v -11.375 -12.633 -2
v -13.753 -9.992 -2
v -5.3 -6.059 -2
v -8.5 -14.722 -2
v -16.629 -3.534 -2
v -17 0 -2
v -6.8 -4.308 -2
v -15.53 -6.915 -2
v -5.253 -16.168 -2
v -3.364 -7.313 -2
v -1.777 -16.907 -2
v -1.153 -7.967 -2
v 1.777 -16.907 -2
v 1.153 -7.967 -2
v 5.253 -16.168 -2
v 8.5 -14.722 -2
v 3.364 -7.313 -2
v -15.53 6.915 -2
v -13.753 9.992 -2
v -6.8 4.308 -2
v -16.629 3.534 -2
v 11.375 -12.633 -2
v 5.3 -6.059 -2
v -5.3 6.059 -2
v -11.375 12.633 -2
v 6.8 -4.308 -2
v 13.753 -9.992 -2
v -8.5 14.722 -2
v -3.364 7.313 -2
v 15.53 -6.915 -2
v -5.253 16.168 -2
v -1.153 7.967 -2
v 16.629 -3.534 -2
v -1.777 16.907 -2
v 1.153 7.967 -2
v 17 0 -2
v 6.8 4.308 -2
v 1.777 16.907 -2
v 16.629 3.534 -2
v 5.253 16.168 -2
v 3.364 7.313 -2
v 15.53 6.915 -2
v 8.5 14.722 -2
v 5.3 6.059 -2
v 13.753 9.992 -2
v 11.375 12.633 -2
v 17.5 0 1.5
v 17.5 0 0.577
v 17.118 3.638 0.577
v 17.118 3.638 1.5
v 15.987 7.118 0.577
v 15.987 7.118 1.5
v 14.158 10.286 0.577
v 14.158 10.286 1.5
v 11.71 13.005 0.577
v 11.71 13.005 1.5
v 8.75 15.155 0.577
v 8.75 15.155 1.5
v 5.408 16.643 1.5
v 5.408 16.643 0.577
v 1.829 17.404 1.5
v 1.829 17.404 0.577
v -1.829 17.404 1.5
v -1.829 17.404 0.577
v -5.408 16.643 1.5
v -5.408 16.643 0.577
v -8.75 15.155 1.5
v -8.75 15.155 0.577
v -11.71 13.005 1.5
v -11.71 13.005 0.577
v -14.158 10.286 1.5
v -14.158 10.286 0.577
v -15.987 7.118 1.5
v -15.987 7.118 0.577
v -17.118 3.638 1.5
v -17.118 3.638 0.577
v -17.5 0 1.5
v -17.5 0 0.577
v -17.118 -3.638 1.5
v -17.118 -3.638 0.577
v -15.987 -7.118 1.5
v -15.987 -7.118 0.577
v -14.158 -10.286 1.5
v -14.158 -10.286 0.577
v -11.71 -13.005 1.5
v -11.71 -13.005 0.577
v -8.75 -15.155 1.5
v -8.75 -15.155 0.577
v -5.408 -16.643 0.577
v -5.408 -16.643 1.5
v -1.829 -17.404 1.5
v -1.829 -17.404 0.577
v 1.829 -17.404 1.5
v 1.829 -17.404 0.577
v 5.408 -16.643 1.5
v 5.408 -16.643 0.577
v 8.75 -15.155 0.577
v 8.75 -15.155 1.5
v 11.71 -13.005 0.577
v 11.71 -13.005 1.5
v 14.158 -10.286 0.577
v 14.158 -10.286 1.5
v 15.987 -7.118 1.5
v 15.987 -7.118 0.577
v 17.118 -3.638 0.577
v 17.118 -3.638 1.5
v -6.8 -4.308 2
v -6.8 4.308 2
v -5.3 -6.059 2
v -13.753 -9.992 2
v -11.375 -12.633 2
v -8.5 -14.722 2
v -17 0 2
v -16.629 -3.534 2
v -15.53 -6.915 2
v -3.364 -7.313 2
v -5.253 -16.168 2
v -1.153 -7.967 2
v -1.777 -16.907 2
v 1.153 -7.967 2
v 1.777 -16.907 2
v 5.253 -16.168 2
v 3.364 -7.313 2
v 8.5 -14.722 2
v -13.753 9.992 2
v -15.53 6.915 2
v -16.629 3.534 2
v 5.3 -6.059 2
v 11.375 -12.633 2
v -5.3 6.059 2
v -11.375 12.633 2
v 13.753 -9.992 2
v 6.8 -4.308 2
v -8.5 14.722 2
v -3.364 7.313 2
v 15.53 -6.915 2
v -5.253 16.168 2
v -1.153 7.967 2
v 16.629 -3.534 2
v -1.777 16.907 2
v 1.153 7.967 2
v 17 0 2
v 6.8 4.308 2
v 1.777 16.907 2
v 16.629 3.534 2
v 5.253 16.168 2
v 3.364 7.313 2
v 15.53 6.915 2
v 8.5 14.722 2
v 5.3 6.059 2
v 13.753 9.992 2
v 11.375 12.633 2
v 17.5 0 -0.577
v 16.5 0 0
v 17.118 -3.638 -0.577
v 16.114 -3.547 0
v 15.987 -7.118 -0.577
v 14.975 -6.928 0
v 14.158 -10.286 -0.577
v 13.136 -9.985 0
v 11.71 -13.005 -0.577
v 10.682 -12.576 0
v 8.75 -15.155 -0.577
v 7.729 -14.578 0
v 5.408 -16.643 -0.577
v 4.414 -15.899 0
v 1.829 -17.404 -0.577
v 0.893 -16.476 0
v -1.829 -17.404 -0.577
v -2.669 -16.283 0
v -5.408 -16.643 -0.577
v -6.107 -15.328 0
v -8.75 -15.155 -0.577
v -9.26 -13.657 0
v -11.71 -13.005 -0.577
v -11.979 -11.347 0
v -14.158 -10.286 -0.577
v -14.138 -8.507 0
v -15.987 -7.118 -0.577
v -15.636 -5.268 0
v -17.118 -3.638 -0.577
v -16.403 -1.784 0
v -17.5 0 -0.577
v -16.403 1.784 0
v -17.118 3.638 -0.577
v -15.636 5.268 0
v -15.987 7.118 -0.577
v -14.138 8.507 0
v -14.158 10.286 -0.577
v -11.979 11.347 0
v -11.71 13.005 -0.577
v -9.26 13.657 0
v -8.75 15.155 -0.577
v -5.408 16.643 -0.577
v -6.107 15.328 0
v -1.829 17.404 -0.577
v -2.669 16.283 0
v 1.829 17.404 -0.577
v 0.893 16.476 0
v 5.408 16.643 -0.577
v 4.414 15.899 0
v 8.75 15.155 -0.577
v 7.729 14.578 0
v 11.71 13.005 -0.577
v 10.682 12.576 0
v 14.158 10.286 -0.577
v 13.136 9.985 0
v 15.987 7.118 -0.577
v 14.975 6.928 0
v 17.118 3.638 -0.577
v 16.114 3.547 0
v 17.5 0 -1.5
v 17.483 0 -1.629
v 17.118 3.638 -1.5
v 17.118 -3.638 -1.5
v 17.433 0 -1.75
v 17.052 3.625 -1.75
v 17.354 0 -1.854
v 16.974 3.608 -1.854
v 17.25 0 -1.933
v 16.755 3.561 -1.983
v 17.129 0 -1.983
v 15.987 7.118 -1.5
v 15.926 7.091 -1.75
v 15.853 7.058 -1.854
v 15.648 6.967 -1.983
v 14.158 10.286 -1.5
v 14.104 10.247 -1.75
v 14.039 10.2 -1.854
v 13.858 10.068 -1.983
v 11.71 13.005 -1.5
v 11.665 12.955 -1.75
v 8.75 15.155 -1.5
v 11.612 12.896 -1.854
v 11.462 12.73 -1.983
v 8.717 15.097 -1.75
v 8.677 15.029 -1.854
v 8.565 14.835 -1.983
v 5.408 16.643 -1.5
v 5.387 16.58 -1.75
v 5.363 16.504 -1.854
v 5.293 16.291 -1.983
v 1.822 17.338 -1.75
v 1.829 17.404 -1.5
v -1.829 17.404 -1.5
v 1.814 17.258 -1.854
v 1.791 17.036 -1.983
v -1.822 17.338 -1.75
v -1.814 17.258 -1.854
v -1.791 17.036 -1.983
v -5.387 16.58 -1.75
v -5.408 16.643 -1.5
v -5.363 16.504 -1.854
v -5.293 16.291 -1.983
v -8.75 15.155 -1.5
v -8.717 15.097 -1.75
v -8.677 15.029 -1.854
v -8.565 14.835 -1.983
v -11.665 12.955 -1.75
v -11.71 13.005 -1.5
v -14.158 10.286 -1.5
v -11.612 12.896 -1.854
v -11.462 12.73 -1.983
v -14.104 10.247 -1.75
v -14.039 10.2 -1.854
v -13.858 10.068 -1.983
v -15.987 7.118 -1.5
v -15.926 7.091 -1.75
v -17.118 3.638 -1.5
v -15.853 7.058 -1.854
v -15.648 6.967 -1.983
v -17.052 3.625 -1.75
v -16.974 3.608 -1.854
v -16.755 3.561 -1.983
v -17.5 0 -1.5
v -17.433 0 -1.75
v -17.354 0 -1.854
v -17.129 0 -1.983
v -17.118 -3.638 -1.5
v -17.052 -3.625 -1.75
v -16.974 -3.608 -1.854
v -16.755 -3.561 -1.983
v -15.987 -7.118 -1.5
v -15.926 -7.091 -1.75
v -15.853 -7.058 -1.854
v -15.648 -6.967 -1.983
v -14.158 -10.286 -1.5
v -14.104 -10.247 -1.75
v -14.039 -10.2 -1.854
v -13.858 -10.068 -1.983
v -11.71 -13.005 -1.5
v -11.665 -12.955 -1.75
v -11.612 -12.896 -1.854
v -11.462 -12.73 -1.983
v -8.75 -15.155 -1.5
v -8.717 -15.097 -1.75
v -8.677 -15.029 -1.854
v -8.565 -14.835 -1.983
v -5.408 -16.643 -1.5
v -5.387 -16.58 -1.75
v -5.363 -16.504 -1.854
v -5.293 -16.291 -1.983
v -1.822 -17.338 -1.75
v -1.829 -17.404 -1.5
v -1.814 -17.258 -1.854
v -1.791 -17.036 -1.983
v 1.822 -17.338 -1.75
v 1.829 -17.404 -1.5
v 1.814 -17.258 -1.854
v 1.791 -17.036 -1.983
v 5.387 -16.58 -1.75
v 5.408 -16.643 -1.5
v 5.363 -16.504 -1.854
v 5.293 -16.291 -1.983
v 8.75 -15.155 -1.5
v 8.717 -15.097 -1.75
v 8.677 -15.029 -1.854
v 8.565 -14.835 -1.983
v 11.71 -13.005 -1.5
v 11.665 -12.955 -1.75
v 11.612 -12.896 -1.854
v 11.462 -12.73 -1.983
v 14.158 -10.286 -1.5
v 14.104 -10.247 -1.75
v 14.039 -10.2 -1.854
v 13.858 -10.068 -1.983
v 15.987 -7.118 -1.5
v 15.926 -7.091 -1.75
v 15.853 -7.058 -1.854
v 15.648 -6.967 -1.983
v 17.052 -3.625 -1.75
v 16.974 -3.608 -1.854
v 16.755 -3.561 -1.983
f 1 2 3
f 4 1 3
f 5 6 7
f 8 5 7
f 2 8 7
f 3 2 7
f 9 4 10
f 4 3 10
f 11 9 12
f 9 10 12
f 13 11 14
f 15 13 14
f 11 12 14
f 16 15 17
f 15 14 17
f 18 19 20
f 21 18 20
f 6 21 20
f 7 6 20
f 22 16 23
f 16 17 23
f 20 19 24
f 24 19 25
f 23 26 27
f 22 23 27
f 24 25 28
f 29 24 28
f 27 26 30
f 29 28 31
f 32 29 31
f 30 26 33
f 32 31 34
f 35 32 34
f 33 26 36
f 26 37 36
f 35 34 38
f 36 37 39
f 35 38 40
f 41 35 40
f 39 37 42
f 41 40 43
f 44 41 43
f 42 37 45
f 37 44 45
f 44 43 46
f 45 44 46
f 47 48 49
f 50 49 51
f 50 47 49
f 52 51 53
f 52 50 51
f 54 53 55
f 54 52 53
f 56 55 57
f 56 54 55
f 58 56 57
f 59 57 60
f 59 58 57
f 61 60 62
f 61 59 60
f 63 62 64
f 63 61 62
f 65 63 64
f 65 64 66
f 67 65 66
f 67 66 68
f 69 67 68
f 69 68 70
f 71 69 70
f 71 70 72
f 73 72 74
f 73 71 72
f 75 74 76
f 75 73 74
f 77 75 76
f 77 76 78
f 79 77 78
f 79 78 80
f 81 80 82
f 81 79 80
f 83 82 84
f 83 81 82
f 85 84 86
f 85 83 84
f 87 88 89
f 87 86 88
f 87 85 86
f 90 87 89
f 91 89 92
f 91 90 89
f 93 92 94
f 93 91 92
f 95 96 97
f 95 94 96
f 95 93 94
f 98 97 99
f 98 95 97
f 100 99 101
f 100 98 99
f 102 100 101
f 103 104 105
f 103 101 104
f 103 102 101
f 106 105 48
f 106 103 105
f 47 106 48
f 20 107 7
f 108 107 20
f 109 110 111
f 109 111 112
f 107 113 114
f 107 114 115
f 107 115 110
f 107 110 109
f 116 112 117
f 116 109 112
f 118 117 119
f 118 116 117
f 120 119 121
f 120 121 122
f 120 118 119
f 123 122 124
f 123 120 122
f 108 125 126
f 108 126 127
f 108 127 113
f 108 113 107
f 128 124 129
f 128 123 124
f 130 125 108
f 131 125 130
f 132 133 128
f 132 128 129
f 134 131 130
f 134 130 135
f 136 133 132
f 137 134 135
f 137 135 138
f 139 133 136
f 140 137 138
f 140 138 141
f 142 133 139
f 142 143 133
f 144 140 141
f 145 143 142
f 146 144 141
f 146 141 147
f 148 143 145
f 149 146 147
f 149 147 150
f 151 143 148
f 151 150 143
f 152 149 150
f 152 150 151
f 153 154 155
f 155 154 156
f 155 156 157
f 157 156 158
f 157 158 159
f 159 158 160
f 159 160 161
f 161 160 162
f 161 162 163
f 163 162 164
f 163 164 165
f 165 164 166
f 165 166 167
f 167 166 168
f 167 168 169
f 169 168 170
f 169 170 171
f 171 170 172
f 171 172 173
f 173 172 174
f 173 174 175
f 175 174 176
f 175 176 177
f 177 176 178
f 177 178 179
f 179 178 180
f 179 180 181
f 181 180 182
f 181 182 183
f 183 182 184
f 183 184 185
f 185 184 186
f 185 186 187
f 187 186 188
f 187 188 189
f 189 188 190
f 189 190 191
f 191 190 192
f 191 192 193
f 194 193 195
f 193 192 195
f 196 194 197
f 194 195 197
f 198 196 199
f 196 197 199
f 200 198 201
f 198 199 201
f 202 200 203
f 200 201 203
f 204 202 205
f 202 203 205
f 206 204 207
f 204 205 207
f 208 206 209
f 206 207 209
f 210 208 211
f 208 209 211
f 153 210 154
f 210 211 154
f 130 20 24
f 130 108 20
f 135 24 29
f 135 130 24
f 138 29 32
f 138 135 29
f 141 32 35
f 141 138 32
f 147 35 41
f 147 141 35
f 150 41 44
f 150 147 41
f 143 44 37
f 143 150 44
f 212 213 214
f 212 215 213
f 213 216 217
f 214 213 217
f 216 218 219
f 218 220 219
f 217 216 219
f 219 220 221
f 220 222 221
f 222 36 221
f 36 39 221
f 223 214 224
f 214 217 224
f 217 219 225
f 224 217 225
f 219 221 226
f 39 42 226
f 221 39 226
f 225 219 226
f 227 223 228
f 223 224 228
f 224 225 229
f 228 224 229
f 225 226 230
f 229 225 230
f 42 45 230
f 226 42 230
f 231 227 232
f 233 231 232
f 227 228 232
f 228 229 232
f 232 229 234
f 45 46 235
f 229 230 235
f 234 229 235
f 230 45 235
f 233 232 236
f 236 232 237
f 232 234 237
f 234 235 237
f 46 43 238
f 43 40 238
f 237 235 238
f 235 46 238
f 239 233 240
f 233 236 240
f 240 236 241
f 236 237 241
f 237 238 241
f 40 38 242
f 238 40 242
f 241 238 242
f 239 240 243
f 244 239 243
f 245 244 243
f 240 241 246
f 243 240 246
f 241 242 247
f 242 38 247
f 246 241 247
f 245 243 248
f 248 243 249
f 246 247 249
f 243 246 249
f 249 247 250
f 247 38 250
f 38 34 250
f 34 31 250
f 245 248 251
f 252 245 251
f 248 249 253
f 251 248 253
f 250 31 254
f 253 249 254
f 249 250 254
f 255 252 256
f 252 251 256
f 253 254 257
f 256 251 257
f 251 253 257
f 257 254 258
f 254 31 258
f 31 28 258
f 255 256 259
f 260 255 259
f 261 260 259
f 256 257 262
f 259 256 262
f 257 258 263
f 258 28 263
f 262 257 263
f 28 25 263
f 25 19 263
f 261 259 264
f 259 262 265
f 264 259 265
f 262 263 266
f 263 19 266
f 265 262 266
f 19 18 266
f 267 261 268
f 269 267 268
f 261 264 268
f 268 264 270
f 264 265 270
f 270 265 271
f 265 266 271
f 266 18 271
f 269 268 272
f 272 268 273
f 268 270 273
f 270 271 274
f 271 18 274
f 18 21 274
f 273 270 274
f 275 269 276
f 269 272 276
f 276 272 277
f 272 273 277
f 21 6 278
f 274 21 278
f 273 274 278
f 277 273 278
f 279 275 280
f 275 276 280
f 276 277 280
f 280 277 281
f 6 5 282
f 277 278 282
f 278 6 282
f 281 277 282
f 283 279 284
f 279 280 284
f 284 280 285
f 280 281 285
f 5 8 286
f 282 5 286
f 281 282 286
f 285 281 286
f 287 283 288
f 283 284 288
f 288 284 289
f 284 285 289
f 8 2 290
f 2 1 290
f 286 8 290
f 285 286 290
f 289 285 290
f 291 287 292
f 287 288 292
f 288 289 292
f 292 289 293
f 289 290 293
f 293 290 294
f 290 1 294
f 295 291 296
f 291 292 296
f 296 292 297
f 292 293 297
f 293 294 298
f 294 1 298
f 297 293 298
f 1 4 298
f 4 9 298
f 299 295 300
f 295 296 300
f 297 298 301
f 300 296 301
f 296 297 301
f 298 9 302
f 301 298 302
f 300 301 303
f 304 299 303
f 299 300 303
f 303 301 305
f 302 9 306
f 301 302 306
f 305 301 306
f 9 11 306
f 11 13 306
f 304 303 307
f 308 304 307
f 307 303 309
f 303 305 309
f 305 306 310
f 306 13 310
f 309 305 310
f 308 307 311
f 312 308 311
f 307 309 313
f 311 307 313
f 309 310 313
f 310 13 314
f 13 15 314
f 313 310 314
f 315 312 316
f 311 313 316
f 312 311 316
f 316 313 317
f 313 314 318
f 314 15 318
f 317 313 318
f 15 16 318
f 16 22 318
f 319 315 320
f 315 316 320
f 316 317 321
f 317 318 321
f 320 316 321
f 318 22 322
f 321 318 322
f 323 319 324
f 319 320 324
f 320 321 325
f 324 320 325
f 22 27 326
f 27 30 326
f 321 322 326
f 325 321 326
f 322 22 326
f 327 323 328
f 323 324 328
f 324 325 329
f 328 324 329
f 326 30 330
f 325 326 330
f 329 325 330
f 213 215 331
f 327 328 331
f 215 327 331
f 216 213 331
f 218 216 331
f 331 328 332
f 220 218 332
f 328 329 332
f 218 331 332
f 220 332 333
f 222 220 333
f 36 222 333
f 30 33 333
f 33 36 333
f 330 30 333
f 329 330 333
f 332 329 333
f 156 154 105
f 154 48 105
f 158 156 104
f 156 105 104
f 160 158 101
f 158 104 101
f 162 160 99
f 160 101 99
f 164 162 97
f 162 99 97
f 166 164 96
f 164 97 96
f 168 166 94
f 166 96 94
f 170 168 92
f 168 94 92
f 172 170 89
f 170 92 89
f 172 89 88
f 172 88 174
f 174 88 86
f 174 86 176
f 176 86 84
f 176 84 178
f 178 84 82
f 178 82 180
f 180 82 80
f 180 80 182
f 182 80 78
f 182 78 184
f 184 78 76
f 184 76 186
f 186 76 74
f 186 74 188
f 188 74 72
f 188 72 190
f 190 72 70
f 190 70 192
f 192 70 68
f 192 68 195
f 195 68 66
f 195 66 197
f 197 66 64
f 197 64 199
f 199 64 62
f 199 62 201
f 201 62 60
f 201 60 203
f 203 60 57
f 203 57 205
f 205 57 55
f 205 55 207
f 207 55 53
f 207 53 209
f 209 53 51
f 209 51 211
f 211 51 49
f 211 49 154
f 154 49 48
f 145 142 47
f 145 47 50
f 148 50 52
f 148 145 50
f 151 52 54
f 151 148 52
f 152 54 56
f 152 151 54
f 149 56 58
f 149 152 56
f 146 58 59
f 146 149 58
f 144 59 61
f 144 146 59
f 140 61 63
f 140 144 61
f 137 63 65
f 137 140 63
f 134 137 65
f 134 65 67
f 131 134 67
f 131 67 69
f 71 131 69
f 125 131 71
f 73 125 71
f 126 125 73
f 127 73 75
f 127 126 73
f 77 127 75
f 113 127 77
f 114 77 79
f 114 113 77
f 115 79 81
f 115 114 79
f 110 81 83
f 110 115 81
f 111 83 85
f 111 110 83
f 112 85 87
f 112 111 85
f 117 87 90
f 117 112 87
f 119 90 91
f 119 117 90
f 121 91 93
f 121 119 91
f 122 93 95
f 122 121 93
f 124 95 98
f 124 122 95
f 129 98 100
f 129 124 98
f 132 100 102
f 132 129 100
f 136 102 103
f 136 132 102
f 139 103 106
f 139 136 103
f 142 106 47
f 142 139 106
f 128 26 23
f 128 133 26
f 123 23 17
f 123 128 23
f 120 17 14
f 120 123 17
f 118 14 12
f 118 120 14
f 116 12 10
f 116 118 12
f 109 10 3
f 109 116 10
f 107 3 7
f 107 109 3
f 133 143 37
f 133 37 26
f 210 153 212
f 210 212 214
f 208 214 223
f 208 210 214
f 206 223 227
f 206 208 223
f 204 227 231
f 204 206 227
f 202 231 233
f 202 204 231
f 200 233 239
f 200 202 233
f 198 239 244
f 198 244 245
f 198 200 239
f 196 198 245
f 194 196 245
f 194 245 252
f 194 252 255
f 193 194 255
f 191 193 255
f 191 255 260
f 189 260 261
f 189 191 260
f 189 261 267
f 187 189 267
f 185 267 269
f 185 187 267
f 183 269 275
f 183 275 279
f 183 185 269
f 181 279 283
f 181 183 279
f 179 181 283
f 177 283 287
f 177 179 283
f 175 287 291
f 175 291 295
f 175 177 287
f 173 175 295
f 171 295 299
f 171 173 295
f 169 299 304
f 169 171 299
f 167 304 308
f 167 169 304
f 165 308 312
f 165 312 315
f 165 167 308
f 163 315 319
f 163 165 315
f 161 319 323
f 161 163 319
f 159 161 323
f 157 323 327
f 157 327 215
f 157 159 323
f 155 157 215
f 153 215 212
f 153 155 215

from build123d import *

# Parameters (mm, degrees)
SKETCH_1_R      = 17.5
EXTRUDE_2_DEPTH = 2
CHAMFER_1_SIZE  = 0.5
FILLET_2_R      = 0.5


with BuildPart() as part:
    # Эскиз1 → Бобышка-Вытянуть2 (new, symmetric)
    with BuildSketch(Plane.XY):
        Circle(SKETCH_1_R)
        with BuildLine():
            Line((6.8, 4.308421985), (6.8, -4.308421985))
            ThreePointArc((6.8, -4.308421985), (0, -8.05), (-6.8, -4.308421985))
            Line((-6.8, -4.308421985), (-6.8, 4.308421985))
            ThreePointArc((-6.8, 4.308421985), (0, 8.05), (6.8, 4.308421985))
        make_face(mode=Mode.SUBTRACT)
    extrude(amount=EXTRUDE_2_DEPTH, both=True)

    # Эскиз2 → Вырез-Повернуть1 (revolve, cut)
    with BuildSketch(Plane(origin=(0, 0, 0), x_dir=(0, 0, -1), z_dir=(1, 0, 0)), mode=Mode.PRIVATE) as cut_revolve_1_sk:
        Polygon((-0.577350269, 17.5), (0.577350269, 17.5), (0, 16.5), align=None)
    revolve(cut_revolve_1_sk.sketch.rotate(Axis((0, 0, 3.24866267), (0, 0, -1)), 90), axis=Axis((0, 0, 3.24866267), (0, 0, -1)), mode=Mode.SUBTRACT)

    # Фаска1
    chamfer_1_edges = [part.edges().sort_by_distance(p)[0] for p in [
        (-17.5, 0, 2),
    ]]
    chamfer(chamfer_1_edges, length=CHAMFER_1_SIZE)

    # Скругление2
    fillet_2_edges = [part.edges().sort_by_distance(p)[0] for p in [
        (-17.5, 0, -2),
    ]]
    fillet(fillet_2_edges, radius=FILLET_2_R)


solid = part.part
